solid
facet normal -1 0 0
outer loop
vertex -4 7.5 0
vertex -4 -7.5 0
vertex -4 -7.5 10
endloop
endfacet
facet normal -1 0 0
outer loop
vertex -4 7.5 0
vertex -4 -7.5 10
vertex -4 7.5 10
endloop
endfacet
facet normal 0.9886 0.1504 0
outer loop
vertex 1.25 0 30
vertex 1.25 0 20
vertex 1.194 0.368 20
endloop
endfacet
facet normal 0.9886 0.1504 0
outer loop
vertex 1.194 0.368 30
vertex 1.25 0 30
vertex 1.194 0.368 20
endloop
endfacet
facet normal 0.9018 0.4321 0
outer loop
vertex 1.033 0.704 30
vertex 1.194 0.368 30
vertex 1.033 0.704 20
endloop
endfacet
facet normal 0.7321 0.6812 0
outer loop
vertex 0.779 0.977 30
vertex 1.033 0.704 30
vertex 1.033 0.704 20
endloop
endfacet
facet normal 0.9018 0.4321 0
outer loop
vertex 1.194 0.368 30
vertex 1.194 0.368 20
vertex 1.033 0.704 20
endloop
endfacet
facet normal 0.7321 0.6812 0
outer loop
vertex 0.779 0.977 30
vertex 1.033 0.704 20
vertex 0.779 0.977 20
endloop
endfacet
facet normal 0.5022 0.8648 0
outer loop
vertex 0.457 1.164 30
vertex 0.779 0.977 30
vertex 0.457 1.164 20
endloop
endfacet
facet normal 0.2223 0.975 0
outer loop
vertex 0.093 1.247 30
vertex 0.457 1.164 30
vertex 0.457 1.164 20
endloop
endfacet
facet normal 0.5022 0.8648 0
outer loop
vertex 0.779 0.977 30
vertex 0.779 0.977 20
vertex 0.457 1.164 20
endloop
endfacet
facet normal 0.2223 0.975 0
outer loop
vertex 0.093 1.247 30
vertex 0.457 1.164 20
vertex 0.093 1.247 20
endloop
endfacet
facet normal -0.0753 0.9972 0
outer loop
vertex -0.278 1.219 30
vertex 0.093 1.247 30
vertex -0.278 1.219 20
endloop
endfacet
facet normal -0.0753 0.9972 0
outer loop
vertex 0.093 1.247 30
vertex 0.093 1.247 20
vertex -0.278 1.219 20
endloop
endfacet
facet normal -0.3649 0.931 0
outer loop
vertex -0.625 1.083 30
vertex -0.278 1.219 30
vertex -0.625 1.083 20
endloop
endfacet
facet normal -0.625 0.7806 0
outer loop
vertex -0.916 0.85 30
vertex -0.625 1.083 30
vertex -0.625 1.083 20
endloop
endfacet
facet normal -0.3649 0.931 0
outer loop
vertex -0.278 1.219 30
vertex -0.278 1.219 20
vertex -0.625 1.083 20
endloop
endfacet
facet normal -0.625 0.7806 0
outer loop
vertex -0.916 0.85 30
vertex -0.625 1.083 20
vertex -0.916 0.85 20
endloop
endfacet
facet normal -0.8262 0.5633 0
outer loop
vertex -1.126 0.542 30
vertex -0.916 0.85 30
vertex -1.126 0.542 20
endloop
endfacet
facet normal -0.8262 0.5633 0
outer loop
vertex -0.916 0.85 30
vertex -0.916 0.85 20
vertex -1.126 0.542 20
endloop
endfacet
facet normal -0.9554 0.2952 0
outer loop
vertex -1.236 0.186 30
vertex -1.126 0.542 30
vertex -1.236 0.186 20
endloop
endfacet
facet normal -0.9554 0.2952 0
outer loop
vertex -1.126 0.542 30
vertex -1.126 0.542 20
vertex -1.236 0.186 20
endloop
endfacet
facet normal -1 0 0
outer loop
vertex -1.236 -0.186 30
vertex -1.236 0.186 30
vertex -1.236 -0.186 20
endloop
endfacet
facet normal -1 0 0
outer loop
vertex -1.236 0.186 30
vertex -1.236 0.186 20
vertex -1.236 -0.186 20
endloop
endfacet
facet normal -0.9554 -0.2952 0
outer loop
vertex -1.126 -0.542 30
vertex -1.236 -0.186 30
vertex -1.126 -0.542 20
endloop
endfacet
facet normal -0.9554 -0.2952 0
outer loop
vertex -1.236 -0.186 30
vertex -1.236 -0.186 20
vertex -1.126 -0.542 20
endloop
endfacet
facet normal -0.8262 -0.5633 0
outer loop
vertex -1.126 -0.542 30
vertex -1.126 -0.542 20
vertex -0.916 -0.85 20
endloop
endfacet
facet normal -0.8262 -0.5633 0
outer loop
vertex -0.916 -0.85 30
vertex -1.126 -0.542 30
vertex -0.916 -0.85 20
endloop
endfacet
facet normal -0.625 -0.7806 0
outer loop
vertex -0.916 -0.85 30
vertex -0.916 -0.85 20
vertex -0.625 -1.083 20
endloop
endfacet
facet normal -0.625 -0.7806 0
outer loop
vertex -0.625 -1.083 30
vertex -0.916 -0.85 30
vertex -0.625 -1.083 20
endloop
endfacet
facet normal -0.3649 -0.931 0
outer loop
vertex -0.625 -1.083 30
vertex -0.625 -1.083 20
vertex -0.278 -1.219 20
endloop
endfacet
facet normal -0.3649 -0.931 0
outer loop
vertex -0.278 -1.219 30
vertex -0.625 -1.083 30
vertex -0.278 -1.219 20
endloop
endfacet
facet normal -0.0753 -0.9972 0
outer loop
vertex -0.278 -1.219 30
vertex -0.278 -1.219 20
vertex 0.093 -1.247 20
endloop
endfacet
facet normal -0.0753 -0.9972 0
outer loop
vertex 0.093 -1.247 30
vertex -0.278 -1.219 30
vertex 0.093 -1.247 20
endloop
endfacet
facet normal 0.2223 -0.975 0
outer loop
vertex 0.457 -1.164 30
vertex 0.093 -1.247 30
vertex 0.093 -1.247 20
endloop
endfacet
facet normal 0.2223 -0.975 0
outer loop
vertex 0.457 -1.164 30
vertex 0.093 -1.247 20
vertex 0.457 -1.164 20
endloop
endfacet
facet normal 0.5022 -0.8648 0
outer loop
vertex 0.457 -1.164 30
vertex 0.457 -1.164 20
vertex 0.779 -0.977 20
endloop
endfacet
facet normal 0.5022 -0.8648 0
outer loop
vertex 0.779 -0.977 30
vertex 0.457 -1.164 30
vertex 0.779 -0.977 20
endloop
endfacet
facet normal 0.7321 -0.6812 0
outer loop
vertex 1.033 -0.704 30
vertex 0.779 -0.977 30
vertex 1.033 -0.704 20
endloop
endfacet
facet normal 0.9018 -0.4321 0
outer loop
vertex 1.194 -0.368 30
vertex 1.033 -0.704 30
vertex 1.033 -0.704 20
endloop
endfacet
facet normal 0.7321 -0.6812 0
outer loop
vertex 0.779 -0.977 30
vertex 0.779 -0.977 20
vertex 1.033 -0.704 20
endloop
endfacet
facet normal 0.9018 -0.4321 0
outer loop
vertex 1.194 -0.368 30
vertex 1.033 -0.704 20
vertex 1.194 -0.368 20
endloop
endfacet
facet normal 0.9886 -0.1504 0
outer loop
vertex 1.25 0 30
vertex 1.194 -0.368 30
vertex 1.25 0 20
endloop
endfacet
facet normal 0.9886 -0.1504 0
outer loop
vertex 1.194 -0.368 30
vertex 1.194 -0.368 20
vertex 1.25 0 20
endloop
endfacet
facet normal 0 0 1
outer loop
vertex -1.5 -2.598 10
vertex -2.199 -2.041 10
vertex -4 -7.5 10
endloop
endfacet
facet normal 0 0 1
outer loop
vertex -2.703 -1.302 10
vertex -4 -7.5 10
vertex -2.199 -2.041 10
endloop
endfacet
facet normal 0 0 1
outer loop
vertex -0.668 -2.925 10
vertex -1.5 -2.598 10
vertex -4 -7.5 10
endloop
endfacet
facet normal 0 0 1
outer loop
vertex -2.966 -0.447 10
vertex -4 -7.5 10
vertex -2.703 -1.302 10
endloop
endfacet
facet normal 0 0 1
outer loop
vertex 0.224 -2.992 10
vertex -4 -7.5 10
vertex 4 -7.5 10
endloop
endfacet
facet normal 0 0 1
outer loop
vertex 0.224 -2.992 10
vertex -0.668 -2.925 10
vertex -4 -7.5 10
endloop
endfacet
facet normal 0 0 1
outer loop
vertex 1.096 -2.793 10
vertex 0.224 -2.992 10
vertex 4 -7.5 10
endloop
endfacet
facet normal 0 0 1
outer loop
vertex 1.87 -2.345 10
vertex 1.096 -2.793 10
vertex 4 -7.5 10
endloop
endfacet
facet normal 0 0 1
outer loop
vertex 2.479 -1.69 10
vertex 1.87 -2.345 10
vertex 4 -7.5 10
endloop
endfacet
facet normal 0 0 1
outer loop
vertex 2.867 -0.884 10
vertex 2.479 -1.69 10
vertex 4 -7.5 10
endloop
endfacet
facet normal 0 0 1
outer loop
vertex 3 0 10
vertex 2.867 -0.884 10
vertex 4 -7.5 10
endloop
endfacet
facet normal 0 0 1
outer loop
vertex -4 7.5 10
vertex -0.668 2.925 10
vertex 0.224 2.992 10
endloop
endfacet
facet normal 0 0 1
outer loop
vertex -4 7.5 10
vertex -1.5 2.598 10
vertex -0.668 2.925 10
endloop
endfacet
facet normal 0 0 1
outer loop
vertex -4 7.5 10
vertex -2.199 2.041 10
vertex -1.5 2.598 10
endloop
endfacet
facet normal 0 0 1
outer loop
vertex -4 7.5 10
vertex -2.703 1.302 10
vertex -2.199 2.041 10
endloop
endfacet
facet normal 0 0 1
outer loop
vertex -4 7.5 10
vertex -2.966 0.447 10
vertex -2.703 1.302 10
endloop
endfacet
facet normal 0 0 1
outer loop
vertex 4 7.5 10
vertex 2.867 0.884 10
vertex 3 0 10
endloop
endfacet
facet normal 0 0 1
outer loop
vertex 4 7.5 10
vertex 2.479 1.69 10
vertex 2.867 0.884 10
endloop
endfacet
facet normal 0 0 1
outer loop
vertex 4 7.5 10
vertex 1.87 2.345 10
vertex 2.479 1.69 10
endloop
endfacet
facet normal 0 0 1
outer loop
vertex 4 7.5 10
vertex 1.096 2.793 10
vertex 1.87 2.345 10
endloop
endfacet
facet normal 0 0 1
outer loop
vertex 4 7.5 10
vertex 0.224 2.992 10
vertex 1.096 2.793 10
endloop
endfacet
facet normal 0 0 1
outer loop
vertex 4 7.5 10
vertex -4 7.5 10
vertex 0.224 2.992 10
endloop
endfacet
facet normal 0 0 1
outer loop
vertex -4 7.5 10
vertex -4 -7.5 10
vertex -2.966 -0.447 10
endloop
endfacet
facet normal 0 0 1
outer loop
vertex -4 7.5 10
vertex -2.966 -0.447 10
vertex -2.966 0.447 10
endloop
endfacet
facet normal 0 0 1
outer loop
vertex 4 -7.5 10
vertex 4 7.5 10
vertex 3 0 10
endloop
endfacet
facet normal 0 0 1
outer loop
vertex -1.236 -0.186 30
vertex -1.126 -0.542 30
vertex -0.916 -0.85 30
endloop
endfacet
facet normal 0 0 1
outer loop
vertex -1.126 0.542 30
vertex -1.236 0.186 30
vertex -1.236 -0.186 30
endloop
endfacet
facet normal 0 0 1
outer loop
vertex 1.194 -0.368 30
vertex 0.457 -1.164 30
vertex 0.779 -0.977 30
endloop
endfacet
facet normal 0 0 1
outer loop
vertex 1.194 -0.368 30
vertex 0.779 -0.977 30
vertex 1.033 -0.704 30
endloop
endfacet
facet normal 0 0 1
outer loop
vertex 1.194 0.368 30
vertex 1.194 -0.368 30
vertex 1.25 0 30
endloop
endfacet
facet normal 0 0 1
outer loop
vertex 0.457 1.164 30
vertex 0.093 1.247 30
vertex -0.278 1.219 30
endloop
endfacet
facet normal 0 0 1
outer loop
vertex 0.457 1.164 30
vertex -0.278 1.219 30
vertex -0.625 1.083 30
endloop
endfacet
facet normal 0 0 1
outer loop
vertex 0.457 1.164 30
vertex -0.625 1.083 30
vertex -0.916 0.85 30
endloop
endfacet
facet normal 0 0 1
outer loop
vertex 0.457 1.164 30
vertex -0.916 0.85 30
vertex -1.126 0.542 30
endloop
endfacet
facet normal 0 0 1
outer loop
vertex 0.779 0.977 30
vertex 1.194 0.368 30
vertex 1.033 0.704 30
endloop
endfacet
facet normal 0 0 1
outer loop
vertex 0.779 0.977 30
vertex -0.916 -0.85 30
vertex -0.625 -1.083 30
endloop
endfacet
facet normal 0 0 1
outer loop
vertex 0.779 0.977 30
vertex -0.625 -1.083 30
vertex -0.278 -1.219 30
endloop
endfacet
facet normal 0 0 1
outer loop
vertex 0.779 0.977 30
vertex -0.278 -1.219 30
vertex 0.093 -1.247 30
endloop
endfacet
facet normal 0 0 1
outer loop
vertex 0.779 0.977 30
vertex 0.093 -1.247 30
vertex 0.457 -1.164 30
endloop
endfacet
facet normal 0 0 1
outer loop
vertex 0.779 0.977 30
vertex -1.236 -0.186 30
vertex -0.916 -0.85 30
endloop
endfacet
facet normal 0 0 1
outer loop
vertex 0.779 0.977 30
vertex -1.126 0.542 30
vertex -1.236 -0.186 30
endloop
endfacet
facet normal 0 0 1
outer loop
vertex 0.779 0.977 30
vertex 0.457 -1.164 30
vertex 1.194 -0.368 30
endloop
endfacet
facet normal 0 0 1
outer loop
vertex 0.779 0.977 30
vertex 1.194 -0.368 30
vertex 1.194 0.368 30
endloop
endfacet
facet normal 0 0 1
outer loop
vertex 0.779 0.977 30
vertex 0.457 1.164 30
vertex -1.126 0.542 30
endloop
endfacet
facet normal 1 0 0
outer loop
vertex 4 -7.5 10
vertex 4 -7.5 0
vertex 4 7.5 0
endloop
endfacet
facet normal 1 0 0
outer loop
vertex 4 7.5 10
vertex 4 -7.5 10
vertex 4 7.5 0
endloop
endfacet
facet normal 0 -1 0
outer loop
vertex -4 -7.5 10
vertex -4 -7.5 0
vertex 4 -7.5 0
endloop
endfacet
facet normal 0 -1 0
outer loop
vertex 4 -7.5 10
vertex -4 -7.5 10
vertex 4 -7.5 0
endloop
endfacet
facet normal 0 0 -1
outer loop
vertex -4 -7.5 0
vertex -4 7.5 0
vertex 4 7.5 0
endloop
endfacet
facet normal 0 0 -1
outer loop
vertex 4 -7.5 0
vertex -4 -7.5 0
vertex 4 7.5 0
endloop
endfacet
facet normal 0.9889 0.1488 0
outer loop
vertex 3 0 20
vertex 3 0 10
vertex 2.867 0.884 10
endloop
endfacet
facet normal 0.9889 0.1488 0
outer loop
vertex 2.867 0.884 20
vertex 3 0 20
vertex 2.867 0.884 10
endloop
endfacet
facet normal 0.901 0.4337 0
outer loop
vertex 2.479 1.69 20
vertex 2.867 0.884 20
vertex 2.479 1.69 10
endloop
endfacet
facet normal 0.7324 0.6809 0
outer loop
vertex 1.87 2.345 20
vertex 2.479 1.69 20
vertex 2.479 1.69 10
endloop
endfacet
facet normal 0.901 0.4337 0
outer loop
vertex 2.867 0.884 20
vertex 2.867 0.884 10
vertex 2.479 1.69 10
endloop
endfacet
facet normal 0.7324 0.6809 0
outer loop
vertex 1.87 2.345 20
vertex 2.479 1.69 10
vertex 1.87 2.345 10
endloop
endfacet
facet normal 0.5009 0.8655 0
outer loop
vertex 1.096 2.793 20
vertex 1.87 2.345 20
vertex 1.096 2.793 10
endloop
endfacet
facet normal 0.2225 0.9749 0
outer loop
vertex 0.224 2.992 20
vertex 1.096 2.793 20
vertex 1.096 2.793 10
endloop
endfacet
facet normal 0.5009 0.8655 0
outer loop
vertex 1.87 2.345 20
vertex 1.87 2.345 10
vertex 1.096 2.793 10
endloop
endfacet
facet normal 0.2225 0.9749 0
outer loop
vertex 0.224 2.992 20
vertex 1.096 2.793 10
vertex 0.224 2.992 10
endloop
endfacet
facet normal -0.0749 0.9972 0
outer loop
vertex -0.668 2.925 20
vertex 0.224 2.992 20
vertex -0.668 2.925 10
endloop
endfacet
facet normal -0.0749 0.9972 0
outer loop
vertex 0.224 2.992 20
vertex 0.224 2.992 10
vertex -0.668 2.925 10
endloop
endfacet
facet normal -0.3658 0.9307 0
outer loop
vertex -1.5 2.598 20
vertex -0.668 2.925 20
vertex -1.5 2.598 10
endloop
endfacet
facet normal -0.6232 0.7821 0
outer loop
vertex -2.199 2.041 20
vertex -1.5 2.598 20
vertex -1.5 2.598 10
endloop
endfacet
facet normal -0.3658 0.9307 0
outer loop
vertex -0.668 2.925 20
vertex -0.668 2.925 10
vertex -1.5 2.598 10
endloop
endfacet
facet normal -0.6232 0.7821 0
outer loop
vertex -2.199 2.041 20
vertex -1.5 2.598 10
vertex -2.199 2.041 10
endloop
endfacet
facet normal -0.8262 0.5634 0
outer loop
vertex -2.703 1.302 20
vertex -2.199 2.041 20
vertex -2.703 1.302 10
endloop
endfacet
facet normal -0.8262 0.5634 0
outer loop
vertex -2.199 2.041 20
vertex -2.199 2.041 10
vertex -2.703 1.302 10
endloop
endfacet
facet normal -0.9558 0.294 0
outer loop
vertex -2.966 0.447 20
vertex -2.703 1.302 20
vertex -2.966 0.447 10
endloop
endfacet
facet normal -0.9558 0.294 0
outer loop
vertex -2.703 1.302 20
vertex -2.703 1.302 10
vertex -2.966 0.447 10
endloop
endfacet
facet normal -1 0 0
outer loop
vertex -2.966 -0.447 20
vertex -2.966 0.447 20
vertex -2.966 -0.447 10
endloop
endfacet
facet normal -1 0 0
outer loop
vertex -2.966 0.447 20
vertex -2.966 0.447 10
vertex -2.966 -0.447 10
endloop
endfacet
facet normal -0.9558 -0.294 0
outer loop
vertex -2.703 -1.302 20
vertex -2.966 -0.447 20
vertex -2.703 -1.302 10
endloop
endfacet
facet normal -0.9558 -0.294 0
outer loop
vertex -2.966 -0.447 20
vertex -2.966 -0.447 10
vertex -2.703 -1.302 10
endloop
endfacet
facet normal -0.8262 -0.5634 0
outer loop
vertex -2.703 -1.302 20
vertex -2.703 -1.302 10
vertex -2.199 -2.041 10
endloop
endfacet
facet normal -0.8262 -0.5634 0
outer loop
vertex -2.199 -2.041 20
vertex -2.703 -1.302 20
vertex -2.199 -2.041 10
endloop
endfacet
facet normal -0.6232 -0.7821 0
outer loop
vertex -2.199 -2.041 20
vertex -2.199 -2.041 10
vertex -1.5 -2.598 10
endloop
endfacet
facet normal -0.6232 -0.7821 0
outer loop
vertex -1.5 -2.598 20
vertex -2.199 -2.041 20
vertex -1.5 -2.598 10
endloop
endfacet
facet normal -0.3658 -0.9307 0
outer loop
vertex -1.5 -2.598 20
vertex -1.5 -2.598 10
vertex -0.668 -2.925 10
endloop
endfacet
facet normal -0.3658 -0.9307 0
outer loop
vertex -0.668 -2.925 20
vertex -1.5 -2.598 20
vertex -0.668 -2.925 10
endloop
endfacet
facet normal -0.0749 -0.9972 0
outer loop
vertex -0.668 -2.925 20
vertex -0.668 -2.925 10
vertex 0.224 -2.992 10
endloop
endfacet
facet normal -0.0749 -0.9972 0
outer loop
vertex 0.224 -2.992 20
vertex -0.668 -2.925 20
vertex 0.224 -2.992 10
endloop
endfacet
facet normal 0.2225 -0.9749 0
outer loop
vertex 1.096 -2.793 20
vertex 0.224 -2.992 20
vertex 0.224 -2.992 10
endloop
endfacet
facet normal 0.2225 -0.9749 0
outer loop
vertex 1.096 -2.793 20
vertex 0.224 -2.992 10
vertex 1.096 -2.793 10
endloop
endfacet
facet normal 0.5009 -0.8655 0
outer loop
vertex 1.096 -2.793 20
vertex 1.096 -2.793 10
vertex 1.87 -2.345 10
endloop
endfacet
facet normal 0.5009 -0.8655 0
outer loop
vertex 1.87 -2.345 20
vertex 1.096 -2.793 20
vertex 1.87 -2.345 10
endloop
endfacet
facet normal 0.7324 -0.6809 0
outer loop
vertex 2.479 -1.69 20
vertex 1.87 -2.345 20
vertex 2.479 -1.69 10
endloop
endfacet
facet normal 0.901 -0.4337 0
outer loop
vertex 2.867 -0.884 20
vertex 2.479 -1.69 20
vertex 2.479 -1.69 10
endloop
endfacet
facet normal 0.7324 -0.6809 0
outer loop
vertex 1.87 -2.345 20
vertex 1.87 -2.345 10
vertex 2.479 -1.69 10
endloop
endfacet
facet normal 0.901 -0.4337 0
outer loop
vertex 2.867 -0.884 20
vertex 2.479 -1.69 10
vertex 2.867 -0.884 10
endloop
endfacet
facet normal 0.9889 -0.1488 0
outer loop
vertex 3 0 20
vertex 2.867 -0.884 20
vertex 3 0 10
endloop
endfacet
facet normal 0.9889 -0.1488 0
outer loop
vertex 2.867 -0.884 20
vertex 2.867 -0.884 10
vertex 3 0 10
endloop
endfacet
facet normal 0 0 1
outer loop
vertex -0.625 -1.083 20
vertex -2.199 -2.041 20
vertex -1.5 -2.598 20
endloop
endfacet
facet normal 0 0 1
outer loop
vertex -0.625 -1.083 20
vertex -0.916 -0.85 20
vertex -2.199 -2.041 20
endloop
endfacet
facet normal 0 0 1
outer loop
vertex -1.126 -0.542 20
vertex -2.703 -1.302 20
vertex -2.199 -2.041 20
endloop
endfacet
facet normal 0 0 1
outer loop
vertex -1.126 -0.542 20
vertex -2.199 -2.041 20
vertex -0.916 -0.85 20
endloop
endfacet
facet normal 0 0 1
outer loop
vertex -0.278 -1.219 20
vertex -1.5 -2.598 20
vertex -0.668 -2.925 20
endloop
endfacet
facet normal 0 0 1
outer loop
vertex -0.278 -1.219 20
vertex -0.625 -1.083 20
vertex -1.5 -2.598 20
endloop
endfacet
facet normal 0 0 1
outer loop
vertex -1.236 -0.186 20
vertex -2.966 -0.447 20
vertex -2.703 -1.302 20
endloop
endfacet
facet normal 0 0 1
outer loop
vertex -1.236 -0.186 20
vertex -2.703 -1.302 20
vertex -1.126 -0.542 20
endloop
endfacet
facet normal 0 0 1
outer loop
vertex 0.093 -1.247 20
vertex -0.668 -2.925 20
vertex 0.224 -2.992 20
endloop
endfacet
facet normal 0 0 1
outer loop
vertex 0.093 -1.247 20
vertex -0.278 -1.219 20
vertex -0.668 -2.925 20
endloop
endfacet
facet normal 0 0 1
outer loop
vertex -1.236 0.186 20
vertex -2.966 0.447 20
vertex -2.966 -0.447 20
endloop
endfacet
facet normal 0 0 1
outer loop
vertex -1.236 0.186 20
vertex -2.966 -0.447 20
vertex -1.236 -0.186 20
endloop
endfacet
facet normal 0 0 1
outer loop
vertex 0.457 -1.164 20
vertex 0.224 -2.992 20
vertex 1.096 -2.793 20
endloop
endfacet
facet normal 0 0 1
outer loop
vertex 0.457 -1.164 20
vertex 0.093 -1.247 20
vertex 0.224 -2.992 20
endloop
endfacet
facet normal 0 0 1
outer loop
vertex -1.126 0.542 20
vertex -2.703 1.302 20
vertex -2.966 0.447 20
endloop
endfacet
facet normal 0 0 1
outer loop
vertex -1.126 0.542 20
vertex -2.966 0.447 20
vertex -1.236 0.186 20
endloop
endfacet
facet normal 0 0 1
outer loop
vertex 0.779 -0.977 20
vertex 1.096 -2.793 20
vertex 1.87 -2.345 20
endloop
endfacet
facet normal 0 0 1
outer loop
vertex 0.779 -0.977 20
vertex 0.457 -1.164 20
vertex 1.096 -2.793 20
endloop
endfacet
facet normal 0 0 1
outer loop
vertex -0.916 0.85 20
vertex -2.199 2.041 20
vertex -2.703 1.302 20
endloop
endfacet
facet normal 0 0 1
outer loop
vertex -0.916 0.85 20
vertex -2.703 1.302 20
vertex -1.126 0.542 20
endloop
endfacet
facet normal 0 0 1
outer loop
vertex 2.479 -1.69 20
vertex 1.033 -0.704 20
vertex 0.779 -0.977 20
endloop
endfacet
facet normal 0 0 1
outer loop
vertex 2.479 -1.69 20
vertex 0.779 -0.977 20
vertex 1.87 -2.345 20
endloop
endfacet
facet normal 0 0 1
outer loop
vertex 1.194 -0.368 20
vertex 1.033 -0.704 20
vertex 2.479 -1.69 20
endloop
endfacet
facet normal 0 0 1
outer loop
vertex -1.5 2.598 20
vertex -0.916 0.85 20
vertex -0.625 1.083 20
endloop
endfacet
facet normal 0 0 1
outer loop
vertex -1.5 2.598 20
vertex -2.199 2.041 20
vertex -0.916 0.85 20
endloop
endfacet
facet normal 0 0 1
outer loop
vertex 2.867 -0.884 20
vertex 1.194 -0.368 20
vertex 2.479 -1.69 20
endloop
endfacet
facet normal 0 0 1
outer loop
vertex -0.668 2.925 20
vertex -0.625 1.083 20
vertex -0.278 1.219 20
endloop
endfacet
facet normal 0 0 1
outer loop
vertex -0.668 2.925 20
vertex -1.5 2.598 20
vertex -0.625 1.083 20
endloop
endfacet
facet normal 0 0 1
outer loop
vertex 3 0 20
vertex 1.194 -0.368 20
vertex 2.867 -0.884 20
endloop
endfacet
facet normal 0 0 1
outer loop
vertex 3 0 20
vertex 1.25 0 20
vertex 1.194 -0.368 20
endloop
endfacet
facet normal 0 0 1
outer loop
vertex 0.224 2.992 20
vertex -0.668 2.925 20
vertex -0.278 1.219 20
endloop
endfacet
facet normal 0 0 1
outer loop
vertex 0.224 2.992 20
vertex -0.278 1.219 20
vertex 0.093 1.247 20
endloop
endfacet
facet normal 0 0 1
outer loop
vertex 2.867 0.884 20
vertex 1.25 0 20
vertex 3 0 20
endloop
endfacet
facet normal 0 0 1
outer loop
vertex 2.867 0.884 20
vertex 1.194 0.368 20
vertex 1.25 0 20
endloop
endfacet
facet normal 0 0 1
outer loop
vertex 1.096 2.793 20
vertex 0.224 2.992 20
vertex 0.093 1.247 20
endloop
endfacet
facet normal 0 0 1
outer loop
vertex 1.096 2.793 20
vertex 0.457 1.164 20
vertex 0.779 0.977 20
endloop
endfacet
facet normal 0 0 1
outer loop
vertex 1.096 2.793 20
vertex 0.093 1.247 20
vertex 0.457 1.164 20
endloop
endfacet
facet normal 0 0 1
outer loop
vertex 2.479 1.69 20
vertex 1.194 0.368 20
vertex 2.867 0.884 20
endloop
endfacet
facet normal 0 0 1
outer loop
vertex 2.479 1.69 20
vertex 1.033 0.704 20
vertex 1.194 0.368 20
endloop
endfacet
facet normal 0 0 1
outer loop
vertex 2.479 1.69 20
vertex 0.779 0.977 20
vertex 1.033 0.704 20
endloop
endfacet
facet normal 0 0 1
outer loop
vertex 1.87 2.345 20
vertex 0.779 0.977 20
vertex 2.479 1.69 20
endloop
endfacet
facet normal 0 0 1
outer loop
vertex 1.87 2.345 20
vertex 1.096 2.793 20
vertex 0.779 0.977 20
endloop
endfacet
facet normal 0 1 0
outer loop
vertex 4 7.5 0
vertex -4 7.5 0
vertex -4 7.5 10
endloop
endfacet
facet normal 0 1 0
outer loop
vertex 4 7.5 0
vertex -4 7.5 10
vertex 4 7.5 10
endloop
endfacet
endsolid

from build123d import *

# Parameters (mm, degrees)
F0_W     = 8
F0_H     = 15
F1_DEPTH = 10
F2_R     = 3
F3_DEPTH = 10
F4_R     = 1.25
F5_DEPTH = 10


with BuildPart() as f1:
    # F0 (on Top) → F1 (new body)
    with BuildSketch(Plane.XY):
        Rectangle(F0_W, F0_H)
    extrude(amount=F1_DEPTH)

    # F2 (on face) → F3 (join)
    with BuildSketch(Plane.XY.offset(10)):
        Circle(F2_R)
    extrude(amount=F3_DEPTH)

    # F4 (on face) → F5 (join)
    with BuildSketch(Plane.XY.offset(20)):
        Circle(F4_R)
    extrude(amount=F5_DEPTH)


solid = f1.part
